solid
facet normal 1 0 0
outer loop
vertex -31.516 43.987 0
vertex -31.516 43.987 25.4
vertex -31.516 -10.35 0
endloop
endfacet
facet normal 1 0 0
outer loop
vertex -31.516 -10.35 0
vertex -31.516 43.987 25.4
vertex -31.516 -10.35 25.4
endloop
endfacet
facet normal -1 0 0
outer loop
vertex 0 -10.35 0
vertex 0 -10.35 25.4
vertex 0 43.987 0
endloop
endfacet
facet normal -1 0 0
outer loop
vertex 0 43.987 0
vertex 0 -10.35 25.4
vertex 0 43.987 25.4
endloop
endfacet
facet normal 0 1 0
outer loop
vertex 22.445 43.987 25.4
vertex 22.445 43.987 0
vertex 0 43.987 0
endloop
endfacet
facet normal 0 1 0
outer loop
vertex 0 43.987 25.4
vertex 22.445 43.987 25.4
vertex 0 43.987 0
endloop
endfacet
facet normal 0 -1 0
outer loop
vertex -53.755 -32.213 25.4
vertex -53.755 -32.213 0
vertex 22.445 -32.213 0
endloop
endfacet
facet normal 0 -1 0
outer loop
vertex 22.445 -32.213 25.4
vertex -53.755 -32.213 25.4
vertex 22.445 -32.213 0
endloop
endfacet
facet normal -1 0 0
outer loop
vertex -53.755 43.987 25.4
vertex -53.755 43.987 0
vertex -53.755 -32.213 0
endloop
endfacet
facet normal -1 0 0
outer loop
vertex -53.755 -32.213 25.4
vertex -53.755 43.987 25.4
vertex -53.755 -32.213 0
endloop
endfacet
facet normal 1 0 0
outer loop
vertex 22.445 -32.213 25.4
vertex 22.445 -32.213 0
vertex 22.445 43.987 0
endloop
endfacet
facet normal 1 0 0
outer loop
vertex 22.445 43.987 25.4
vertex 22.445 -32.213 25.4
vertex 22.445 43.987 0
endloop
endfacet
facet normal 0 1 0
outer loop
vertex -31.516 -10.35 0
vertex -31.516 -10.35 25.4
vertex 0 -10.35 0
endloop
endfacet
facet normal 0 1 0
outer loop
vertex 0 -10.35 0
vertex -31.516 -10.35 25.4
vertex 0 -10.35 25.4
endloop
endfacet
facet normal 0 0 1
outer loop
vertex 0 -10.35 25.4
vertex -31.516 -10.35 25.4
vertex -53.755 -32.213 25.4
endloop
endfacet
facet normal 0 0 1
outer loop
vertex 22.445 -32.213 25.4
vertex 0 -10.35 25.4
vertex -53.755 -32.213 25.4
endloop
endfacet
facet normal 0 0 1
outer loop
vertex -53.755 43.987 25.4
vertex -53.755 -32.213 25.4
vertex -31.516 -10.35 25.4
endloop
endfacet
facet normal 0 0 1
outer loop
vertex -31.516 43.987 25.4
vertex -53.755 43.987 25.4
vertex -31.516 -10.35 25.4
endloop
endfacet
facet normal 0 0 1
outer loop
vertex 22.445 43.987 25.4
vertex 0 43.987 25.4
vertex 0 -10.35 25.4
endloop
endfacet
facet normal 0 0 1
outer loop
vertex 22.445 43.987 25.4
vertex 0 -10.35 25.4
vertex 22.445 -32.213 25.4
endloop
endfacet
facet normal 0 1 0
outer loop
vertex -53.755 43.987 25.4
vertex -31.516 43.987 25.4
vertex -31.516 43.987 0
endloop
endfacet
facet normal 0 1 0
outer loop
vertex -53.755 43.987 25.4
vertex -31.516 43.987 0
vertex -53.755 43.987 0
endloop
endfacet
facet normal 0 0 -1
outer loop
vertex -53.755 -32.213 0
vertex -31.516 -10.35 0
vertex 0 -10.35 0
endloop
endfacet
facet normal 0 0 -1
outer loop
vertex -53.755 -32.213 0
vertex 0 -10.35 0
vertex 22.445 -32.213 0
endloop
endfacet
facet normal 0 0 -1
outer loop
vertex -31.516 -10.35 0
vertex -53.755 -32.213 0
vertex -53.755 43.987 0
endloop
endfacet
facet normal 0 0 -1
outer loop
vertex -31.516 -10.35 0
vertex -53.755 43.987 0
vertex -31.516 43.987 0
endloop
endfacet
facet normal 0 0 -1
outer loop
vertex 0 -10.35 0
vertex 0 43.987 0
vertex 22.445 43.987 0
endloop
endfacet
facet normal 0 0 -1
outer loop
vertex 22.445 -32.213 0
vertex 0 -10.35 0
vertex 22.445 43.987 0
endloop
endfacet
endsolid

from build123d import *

# Parameters (mm, degrees)
F1_DEPTH = 25.4
F3_DEPTH = 25.4


# Not quite as in the source:
# - a feature names something its author has since deleted; it is built from what else it names


with BuildPart() as f1:
    # F0 (on Top) → F1 (new body)
    with BuildSketch(Plane.XY):
        Polygon((-27.94, 43.9866697311), (-53.755334568, 43.9866697311), (-53.755334568, -32.2133302689), (22.444665432, -32.2133302689), (22.444665432, 43.9866697311), (0, 43.9866697311), (0, 5.8866697311), (-27.94, 5.8866697311), align=None)
    extrude(amount=F1_DEPTH)

    # F2 (on face) → F3 (cut)
    with BuildSketch(Plane.XY.offset(25.4)):
        Polygon((-27.94, 43.9866697311), (-31.5155684948, 43.9866697311), (-31.5155684948, 0), (-31.5155684948, -10.3501314297), (0, -10.3501314297), (0, 5.8866697311), (-27.94, 5.8866697311), align=None)
    extrude(amount=-F3_DEPTH, mode=Mode.SUBTRACT)


solid = f1.part
